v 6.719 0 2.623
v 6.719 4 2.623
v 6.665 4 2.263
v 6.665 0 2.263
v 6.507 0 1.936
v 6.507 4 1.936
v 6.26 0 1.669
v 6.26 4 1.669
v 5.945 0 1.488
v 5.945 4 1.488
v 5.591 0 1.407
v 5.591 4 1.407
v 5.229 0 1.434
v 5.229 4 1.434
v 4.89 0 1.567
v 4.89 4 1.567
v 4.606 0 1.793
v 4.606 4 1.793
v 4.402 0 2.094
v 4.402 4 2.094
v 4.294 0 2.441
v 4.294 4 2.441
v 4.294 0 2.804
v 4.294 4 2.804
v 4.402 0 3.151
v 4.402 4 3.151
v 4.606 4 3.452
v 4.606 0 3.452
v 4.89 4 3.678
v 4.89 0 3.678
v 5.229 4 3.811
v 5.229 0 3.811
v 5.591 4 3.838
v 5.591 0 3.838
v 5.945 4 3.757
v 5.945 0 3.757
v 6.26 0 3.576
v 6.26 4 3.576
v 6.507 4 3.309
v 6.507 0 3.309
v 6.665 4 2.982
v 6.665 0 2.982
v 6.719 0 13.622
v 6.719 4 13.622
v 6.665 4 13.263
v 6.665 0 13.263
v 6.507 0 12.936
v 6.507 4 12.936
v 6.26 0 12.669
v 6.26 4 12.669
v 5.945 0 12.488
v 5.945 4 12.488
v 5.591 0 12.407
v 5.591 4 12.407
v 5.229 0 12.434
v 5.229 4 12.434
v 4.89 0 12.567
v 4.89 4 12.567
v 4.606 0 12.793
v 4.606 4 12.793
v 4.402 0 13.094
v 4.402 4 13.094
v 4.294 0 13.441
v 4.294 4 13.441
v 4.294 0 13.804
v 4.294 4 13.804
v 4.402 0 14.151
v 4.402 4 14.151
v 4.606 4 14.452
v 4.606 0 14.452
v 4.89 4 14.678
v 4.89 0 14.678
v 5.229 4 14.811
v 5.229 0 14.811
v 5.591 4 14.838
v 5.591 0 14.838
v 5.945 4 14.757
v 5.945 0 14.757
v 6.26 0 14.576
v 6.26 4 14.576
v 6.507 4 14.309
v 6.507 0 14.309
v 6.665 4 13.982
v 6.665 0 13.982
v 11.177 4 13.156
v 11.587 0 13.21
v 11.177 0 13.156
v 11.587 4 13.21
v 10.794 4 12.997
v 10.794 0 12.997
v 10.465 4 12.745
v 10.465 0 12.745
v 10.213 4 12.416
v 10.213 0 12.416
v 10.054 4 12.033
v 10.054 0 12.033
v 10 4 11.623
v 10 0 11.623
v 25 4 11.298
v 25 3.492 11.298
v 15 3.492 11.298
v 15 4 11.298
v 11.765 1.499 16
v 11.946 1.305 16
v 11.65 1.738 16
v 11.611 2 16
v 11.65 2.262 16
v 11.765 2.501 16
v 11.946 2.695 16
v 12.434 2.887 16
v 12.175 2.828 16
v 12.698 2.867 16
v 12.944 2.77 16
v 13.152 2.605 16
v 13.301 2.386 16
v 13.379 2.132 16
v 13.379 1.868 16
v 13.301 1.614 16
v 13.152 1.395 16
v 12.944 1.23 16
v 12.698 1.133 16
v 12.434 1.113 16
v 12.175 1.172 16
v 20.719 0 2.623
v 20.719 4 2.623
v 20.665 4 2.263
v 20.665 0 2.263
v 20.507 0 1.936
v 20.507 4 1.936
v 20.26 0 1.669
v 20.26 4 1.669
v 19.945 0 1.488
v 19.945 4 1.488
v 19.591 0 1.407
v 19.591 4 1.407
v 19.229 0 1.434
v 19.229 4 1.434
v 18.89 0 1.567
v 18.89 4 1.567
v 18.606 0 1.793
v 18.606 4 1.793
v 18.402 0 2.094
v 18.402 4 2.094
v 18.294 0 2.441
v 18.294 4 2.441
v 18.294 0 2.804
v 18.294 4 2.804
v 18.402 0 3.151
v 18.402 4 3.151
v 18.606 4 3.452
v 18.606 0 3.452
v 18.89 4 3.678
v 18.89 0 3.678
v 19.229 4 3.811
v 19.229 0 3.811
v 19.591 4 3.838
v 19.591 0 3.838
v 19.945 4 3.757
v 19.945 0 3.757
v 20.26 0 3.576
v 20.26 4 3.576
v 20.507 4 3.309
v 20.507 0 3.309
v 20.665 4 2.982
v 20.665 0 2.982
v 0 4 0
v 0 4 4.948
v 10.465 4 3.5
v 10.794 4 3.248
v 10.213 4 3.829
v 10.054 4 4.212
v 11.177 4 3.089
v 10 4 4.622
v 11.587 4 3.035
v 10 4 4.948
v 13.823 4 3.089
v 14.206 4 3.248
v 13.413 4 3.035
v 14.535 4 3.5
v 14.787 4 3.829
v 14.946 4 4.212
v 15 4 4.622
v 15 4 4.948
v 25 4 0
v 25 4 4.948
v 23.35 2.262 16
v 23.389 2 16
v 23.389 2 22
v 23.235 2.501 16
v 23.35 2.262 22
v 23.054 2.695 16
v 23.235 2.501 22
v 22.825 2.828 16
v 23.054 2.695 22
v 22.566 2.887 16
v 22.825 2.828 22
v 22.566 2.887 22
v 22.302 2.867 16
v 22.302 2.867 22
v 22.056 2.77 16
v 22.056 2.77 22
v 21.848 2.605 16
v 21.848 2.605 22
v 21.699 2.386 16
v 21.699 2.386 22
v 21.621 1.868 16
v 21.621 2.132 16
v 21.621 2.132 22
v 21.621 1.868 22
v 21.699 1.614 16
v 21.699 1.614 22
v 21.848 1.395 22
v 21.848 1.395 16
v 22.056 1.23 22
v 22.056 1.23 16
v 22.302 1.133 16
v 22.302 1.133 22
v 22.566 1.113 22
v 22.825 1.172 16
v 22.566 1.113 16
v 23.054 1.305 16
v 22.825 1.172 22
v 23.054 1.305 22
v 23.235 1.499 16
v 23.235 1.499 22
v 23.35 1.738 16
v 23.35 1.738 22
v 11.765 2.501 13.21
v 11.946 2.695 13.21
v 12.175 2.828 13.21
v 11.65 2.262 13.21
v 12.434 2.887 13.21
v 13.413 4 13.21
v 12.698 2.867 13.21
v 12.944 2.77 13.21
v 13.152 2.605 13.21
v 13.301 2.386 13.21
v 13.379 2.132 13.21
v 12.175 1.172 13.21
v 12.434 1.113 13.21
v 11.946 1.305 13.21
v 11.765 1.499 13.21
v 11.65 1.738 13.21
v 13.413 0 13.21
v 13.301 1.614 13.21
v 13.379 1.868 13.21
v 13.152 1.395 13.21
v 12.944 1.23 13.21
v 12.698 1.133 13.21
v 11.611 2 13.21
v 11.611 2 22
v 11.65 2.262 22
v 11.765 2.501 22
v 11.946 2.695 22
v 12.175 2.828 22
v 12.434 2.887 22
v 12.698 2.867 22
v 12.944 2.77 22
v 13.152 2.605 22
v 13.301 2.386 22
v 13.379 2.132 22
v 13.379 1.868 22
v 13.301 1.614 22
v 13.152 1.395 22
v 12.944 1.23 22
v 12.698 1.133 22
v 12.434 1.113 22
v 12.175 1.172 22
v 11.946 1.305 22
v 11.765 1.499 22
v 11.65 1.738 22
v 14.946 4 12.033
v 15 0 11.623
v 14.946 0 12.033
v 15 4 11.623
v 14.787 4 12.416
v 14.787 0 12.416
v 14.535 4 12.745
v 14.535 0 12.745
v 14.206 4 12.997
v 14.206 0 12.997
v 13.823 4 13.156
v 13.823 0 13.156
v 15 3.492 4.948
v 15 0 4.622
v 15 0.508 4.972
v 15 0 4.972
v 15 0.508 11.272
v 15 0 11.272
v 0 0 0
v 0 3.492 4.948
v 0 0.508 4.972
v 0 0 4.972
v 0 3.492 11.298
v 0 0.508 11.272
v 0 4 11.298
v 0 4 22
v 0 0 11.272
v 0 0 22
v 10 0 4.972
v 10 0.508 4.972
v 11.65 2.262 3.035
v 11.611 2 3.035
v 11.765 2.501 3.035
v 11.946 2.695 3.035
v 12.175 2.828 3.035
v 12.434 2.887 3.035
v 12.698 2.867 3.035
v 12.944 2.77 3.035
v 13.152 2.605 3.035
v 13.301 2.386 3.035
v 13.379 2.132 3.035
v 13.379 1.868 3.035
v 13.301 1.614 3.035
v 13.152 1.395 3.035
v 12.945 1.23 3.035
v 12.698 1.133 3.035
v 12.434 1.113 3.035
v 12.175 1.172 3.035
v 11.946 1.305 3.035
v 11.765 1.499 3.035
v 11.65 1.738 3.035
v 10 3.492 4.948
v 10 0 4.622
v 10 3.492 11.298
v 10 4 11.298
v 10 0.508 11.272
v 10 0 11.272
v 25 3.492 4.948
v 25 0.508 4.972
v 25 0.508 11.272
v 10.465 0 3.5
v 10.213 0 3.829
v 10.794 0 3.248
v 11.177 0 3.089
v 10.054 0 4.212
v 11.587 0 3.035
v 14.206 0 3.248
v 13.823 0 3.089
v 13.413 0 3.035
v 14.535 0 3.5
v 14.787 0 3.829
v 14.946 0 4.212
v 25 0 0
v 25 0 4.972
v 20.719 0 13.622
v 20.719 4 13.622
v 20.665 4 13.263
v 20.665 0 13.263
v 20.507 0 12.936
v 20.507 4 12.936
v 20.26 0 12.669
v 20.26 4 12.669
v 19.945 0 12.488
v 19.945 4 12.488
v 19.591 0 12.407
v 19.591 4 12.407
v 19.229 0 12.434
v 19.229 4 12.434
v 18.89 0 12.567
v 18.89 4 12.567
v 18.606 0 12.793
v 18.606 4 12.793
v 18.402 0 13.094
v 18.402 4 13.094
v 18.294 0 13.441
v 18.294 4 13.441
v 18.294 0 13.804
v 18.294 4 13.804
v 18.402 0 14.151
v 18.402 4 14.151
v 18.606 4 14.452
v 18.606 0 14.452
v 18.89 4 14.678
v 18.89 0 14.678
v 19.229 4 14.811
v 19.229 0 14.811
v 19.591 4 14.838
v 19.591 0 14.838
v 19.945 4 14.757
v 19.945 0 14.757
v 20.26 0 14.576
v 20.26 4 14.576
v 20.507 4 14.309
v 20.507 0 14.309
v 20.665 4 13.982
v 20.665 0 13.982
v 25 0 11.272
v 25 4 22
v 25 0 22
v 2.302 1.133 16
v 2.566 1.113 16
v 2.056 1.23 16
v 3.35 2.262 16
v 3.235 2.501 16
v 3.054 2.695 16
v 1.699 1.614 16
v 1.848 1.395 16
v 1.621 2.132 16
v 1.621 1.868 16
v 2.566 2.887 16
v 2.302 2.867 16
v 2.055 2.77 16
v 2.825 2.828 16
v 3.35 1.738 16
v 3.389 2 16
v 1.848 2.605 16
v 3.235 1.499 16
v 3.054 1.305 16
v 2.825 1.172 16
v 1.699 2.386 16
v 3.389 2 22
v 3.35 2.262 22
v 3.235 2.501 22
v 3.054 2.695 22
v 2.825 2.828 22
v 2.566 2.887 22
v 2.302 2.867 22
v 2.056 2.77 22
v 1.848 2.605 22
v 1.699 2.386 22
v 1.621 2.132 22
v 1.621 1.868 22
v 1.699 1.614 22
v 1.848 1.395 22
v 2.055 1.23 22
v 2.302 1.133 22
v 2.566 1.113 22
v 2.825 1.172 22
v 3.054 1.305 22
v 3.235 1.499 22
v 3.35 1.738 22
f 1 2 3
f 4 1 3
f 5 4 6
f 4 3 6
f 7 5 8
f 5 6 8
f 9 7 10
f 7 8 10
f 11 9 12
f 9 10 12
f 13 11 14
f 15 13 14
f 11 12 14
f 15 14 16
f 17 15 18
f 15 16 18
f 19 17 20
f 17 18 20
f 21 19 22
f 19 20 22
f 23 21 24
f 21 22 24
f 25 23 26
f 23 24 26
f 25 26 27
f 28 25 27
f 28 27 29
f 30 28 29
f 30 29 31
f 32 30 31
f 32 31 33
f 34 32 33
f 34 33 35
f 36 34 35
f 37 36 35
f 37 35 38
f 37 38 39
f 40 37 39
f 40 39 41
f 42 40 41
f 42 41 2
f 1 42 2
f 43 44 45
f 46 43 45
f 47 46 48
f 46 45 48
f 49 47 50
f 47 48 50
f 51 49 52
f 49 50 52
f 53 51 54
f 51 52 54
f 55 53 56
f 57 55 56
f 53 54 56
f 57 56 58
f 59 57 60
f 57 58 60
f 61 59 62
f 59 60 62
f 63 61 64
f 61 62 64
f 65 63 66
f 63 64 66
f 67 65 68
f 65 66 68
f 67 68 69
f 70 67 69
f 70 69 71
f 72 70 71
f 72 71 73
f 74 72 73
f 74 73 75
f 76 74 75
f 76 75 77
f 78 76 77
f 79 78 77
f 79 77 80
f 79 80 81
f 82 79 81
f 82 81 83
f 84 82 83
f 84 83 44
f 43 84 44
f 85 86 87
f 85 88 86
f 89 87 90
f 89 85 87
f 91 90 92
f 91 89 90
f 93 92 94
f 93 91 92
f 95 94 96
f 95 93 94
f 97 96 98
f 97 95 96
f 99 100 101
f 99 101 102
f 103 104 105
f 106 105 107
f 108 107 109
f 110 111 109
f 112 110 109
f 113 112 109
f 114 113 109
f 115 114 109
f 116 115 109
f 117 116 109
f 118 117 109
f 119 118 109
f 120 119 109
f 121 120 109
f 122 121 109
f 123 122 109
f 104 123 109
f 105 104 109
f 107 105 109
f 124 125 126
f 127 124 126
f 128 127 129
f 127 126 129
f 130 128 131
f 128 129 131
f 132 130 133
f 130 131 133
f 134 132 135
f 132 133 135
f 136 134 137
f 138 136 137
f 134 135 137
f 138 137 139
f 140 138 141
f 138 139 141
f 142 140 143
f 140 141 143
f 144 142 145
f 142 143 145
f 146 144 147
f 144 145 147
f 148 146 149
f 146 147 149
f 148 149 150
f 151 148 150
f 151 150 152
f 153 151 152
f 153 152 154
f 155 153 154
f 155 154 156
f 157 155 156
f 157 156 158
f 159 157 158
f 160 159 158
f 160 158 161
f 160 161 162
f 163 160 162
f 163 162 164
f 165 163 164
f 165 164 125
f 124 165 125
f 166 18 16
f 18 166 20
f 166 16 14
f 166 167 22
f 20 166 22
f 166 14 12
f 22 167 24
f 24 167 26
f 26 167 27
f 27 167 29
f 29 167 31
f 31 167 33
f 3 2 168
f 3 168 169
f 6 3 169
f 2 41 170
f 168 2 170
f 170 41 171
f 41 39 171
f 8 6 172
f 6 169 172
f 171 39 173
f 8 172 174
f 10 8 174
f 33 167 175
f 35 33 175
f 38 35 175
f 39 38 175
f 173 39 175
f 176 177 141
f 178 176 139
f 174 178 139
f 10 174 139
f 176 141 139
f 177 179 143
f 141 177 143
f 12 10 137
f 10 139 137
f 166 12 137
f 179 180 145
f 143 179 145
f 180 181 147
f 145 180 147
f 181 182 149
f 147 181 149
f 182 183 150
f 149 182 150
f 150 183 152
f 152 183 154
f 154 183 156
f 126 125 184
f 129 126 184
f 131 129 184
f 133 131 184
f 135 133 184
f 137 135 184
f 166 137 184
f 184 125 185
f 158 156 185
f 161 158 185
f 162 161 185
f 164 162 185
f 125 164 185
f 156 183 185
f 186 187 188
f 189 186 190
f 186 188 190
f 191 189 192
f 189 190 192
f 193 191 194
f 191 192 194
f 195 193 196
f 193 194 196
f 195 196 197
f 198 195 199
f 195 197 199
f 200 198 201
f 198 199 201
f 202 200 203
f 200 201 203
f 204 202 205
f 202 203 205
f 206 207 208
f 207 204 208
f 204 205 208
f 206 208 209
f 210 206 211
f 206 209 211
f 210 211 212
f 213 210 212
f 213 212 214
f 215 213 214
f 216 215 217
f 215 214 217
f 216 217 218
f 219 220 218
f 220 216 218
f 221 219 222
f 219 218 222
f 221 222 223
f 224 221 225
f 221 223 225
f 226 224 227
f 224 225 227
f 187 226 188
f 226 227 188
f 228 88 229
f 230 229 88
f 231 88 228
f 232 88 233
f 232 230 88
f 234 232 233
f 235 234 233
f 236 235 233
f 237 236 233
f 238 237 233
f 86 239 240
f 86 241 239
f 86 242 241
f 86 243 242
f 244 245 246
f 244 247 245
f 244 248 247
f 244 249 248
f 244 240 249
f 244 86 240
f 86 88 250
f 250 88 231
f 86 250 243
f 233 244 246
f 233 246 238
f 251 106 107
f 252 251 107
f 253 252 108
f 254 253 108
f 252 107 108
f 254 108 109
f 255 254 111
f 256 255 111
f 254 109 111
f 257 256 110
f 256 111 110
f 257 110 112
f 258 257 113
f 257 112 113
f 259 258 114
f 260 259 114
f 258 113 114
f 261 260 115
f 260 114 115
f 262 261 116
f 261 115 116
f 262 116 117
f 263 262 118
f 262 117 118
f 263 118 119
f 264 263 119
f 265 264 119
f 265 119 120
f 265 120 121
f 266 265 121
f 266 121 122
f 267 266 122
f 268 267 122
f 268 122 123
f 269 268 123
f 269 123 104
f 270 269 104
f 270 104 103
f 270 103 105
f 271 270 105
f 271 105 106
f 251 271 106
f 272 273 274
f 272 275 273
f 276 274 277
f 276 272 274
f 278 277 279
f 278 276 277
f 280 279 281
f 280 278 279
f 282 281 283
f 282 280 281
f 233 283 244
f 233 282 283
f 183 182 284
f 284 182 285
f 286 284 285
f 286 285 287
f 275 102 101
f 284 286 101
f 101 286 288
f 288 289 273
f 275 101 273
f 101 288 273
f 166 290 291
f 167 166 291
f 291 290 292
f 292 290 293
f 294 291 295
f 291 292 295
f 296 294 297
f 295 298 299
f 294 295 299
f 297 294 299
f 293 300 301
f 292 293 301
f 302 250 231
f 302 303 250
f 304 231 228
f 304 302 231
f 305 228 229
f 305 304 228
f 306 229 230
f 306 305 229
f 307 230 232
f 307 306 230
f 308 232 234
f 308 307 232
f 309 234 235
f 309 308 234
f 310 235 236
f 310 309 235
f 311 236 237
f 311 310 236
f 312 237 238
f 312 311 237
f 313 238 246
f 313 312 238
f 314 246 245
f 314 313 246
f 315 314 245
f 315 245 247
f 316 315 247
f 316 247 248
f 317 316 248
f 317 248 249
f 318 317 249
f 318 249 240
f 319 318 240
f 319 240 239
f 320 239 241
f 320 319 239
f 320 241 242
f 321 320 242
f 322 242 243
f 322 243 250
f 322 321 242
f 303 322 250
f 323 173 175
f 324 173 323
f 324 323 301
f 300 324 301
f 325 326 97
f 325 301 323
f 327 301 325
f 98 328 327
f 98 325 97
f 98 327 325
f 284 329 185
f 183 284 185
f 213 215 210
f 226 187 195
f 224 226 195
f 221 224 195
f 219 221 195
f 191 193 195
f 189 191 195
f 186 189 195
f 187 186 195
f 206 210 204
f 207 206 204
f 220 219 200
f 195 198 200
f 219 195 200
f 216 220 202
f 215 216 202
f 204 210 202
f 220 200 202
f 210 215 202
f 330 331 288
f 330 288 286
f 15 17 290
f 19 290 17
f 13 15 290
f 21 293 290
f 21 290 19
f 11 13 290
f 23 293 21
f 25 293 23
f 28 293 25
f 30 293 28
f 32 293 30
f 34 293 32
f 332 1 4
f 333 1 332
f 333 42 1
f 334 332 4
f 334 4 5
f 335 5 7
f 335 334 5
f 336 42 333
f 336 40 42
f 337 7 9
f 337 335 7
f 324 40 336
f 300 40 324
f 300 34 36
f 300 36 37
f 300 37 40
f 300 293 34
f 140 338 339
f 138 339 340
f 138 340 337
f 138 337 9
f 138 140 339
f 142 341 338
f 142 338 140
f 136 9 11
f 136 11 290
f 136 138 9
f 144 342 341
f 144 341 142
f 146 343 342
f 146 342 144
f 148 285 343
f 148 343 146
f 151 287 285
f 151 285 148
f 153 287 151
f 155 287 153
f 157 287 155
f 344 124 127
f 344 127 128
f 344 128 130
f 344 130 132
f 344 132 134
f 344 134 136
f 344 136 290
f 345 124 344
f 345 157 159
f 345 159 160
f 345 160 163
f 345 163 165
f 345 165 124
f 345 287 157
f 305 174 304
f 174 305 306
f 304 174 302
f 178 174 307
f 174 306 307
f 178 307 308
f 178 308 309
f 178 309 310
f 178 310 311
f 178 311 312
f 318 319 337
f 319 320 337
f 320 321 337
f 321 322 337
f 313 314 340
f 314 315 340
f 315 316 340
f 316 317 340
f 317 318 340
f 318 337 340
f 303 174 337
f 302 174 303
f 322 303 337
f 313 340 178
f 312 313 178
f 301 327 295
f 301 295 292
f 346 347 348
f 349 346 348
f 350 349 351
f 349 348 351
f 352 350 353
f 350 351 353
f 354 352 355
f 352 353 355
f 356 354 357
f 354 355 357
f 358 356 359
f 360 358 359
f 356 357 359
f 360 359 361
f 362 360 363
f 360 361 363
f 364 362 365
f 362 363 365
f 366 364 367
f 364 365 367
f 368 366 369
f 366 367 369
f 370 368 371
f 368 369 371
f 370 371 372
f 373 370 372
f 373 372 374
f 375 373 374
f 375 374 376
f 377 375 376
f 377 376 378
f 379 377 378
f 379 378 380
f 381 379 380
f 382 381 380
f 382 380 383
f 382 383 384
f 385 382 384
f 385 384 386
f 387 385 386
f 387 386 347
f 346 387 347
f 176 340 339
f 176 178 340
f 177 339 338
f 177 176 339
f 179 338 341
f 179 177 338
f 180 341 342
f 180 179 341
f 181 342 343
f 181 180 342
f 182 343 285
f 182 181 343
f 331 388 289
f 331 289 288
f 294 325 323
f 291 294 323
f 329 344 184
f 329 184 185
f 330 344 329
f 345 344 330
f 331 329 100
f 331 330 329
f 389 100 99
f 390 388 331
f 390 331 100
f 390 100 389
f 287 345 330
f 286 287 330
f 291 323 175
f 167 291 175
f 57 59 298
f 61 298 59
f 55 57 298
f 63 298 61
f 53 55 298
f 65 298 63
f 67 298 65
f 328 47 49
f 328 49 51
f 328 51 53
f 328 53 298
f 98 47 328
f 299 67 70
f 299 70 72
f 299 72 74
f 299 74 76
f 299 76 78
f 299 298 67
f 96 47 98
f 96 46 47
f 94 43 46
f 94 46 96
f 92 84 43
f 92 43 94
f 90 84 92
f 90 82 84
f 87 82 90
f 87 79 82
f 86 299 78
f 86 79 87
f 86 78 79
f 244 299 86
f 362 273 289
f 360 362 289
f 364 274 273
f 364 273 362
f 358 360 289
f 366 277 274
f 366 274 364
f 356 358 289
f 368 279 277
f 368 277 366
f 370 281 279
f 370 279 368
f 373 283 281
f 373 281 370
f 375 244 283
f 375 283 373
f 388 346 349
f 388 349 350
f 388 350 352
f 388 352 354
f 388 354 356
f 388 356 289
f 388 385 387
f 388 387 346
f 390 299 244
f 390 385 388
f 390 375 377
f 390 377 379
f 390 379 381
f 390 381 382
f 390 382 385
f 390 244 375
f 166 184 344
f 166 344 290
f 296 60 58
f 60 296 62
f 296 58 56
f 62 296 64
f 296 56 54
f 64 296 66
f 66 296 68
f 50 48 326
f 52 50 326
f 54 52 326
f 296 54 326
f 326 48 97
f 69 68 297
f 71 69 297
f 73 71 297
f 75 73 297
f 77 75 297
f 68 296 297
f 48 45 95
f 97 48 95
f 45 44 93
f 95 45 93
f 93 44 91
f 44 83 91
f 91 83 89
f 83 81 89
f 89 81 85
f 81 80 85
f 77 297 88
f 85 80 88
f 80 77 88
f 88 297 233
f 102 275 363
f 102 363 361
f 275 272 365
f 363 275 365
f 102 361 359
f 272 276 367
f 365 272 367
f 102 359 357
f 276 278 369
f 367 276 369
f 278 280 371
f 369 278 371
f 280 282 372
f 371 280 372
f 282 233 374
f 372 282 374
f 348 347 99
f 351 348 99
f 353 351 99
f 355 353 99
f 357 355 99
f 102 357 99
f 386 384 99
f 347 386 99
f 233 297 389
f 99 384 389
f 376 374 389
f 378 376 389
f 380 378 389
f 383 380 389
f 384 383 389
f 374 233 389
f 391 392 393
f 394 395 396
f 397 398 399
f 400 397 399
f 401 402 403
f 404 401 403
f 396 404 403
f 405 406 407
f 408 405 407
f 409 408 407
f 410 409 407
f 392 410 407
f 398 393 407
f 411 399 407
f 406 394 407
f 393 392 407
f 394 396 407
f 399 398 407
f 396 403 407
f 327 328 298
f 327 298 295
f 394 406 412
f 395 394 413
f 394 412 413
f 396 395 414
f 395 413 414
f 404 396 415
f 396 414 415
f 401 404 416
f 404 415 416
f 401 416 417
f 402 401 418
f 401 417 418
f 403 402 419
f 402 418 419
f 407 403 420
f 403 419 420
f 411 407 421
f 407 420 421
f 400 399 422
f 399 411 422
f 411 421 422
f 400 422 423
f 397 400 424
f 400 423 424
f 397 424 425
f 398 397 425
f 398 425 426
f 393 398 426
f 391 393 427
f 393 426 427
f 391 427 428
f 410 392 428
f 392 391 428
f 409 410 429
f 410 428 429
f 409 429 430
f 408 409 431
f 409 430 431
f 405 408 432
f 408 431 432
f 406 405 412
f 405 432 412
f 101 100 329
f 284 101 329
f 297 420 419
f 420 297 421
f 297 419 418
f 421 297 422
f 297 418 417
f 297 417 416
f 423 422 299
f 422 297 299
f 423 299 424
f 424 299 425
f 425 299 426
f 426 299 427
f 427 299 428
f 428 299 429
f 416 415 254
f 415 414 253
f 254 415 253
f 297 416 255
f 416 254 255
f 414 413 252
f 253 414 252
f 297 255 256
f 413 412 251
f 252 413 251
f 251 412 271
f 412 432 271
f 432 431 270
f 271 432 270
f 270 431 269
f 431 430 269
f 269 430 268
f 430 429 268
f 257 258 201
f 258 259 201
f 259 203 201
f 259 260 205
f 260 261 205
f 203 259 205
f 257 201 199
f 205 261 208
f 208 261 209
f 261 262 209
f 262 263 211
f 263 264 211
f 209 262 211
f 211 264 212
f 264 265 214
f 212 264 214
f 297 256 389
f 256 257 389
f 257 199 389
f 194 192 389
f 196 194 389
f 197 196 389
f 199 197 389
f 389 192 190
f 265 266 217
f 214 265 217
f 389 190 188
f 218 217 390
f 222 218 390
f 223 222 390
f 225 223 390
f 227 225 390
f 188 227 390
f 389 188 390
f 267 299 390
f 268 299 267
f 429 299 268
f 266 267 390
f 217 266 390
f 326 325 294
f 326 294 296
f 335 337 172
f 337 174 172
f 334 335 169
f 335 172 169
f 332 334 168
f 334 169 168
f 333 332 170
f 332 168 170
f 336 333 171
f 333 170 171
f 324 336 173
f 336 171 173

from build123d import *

# Parameters (mm, degrees)
ESBO_O1_W                     = 25
ESBO_O1_H                     = 22
RESSALTO_EXTRUS_O1_DEPTH      = 4
ESBO_O2_W                     = 5
ESBO_O2_H                     = 10.175
CORTE_EXTRUS_O1_DEPTH         = 5
CORTE_EXTRUS_O2_REACH         = 27
ESBO_O3_W                     = 6.3
ESBO_O3_H                     = 0.508
ESBO_O4_W                     = 6.3
ESBO_O4_H                     = 0.508
CORTE_EXTRUS_O3_DEPTH         = 11
ESBO_O5_W                     = 6.35
ESBO_O5_H                     = 0.508
CORTE_EXTRUS_O4_DEPTH         = 11
ESBO_O6_W                     = 6.35
ESBO_O6_H                     = 0.508
CORTE_EXTRUS_O5_DEPTH         = 26
FURO_COM_FOLGA_DE_M21_D       = 2.4384
FURO_COM_FOLGA_DE_M21_DEPTH   = 4
FURO_COM_FOLGA_DE_M1_61_D     = 1.778
FURO_COM_FOLGA_DE_M1_61_DEPTH = 22
FURO_COM_FOLGA_DE_M1_62_D     = 1.778
FURO_COM_FOLGA_DE_M1_62_DEPTH = 3.035
FURO_COM_FOLGA_DE_M1_63_D     = 1.778
FURO_COM_FOLGA_DE_M1_63_DEPTH = 22
FILETE1_R                     = 1.5875
ESBO_O15_R                    = 0.889
RESSALTO_EXTRUS_O2_DEPTH      = 16


with BuildPart() as part:
    # Esboço1 → Ressalto-extrusão1 (new body)
    with BuildSketch(Plane.XZ):
        with Locations((12.5, 11)):
            Rectangle(ESBO_O1_W, ESBO_O1_H)
    extrude(amount=-RESSALTO_EXTRUS_O1_DEPTH)

    # Esboço2 → Corte-extrusão1 (cut, through all)
    with BuildSketch(Plane.XZ):
        with Locations((12.5, 8.1225)):
            Rectangle(ESBO_O2_W, ESBO_O2_H)
    extrude(amount=-CORTE_EXTRUS_O1_DEPTH, mode=Mode.SUBTRACT)

    # Esboço3 → Corte-extrusão2 (cut, up to next)
    with BuildSketch(Plane(origin=(25, 0, 0), x_dir=(0, 0, -1), z_dir=(1, 0, 0)), mode=Mode.PRIVATE) as corte_extrus_o2_sk1:
        with Locations((-8.1225, 0.254)):
            Rectangle(ESBO_O3_W, ESBO_O3_H)
    corte_extrus_o2_tool1 = extrude(corte_extrus_o2_sk1.sketch, amount=-CORTE_EXTRUS_O2_REACH, mode=Mode.PRIVATE) & part.part
    add(corte_extrus_o2_tool1.solids().sort_by_distance((25, 0.254, 8.1225))[0], mode=Mode.SUBTRACT)

    # Esboço4 → Corte-extrusão3 (cut, through all)
    with BuildSketch(Plane(origin=(10, 0, 0), x_dir=(0, 0, -1), z_dir=(1, 0, 0))):
        with Locations((-8.1225, 0.254)):
            Rectangle(ESBO_O4_W, ESBO_O4_H)
    extrude(amount=-CORTE_EXTRUS_O3_DEPTH, mode=Mode.SUBTRACT)

    # Esboço5 → Corte-extrusão4 (cut, through all)
    with BuildSketch(Plane(origin=(10, 0, 0), x_dir=(0, 0, -1), z_dir=(1, 0, 0))):
        with Locations((-8.1225, 3.746)):
            Rectangle(ESBO_O5_W, ESBO_O5_H)
    extrude(amount=-CORTE_EXTRUS_O4_DEPTH, mode=Mode.SUBTRACT)

    # Esboço6 → Corte-extrusão5 (cut, through all)
    with BuildSketch(Plane(origin=(25, 0, 0), x_dir=(0, 0, -1), z_dir=(1, 0, 0))):
        with Locations((-8.1225, 3.746)):
            Rectangle(ESBO_O6_W, ESBO_O6_H)
    extrude(amount=-CORTE_EXTRUS_O5_DEPTH, mode=Mode.SUBTRACT)

    # Furo com folga de M21
    with Locations(Plane(origin=(0, 0, 0), x_dir=(-1, 0, 0), z_dir=(0, -1, 0))):
        with Locations((-19.5, -13.6225), (-19.5, -2.6225), (-5.5, -2.6225), (-5.5, -13.6225)):
            Hole(FURO_COM_FOLGA_DE_M21_D / 2, depth=FURO_COM_FOLGA_DE_M21_DEPTH)

    # Furo com folga de M1.61
    with Locations(Plane(origin=(0, 0, 0), x_dir=(-1, 0, 0), z_dir=(0, 0, -1))):
        with Locations((-2.5, 2), (-22.5, 2)):
            Hole(FURO_COM_FOLGA_DE_M1_61_D / 2, depth=FURO_COM_FOLGA_DE_M1_61_DEPTH)

    # Furo com folga de M1.62
    with Locations(Plane(origin=(0, 0, 0), x_dir=(-1, 0, 0), z_dir=(0, 0, -1))):
        with Locations((-12.5, 2)):
            Hole(FURO_COM_FOLGA_DE_M1_62_D / 2, depth=FURO_COM_FOLGA_DE_M1_62_DEPTH)

    # Furo com folga de M1.63
    with Locations(Plane.XY.offset(22)):
        with Locations((12.5, 2)):
            Hole(FURO_COM_FOLGA_DE_M1_63_D / 2, depth=FURO_COM_FOLGA_DE_M1_63_DEPTH)

    # Filete1
    filete1_edges = [part.edges().sort_by_distance(p)[0] for p in [
        (10, 2, 13.21),
        (15, 2, 13.21),
        (15, 2, 3.035),
        (10, 2, 3.035),
    ]]
    fillet(filete1_edges, radius=FILETE1_R)

    # Esboço15 → Ressalto-extrusão2 (add)
    with BuildSketch(Plane(origin=(0, 0, 0), x_dir=(-1, 0, 0), z_dir=(0, 0, -1))):
        with Locations((-2.5, 2)):
            Circle(ESBO_O15_R)
        with Locations((-12.5, 2)):
            Circle(ESBO_O15_R)
        with Locations((-22.5, 2)):
            Circle(ESBO_O15_R)
    extrude(amount=-RESSALTO_EXTRUS_O2_DEPTH)


solid = part.part
